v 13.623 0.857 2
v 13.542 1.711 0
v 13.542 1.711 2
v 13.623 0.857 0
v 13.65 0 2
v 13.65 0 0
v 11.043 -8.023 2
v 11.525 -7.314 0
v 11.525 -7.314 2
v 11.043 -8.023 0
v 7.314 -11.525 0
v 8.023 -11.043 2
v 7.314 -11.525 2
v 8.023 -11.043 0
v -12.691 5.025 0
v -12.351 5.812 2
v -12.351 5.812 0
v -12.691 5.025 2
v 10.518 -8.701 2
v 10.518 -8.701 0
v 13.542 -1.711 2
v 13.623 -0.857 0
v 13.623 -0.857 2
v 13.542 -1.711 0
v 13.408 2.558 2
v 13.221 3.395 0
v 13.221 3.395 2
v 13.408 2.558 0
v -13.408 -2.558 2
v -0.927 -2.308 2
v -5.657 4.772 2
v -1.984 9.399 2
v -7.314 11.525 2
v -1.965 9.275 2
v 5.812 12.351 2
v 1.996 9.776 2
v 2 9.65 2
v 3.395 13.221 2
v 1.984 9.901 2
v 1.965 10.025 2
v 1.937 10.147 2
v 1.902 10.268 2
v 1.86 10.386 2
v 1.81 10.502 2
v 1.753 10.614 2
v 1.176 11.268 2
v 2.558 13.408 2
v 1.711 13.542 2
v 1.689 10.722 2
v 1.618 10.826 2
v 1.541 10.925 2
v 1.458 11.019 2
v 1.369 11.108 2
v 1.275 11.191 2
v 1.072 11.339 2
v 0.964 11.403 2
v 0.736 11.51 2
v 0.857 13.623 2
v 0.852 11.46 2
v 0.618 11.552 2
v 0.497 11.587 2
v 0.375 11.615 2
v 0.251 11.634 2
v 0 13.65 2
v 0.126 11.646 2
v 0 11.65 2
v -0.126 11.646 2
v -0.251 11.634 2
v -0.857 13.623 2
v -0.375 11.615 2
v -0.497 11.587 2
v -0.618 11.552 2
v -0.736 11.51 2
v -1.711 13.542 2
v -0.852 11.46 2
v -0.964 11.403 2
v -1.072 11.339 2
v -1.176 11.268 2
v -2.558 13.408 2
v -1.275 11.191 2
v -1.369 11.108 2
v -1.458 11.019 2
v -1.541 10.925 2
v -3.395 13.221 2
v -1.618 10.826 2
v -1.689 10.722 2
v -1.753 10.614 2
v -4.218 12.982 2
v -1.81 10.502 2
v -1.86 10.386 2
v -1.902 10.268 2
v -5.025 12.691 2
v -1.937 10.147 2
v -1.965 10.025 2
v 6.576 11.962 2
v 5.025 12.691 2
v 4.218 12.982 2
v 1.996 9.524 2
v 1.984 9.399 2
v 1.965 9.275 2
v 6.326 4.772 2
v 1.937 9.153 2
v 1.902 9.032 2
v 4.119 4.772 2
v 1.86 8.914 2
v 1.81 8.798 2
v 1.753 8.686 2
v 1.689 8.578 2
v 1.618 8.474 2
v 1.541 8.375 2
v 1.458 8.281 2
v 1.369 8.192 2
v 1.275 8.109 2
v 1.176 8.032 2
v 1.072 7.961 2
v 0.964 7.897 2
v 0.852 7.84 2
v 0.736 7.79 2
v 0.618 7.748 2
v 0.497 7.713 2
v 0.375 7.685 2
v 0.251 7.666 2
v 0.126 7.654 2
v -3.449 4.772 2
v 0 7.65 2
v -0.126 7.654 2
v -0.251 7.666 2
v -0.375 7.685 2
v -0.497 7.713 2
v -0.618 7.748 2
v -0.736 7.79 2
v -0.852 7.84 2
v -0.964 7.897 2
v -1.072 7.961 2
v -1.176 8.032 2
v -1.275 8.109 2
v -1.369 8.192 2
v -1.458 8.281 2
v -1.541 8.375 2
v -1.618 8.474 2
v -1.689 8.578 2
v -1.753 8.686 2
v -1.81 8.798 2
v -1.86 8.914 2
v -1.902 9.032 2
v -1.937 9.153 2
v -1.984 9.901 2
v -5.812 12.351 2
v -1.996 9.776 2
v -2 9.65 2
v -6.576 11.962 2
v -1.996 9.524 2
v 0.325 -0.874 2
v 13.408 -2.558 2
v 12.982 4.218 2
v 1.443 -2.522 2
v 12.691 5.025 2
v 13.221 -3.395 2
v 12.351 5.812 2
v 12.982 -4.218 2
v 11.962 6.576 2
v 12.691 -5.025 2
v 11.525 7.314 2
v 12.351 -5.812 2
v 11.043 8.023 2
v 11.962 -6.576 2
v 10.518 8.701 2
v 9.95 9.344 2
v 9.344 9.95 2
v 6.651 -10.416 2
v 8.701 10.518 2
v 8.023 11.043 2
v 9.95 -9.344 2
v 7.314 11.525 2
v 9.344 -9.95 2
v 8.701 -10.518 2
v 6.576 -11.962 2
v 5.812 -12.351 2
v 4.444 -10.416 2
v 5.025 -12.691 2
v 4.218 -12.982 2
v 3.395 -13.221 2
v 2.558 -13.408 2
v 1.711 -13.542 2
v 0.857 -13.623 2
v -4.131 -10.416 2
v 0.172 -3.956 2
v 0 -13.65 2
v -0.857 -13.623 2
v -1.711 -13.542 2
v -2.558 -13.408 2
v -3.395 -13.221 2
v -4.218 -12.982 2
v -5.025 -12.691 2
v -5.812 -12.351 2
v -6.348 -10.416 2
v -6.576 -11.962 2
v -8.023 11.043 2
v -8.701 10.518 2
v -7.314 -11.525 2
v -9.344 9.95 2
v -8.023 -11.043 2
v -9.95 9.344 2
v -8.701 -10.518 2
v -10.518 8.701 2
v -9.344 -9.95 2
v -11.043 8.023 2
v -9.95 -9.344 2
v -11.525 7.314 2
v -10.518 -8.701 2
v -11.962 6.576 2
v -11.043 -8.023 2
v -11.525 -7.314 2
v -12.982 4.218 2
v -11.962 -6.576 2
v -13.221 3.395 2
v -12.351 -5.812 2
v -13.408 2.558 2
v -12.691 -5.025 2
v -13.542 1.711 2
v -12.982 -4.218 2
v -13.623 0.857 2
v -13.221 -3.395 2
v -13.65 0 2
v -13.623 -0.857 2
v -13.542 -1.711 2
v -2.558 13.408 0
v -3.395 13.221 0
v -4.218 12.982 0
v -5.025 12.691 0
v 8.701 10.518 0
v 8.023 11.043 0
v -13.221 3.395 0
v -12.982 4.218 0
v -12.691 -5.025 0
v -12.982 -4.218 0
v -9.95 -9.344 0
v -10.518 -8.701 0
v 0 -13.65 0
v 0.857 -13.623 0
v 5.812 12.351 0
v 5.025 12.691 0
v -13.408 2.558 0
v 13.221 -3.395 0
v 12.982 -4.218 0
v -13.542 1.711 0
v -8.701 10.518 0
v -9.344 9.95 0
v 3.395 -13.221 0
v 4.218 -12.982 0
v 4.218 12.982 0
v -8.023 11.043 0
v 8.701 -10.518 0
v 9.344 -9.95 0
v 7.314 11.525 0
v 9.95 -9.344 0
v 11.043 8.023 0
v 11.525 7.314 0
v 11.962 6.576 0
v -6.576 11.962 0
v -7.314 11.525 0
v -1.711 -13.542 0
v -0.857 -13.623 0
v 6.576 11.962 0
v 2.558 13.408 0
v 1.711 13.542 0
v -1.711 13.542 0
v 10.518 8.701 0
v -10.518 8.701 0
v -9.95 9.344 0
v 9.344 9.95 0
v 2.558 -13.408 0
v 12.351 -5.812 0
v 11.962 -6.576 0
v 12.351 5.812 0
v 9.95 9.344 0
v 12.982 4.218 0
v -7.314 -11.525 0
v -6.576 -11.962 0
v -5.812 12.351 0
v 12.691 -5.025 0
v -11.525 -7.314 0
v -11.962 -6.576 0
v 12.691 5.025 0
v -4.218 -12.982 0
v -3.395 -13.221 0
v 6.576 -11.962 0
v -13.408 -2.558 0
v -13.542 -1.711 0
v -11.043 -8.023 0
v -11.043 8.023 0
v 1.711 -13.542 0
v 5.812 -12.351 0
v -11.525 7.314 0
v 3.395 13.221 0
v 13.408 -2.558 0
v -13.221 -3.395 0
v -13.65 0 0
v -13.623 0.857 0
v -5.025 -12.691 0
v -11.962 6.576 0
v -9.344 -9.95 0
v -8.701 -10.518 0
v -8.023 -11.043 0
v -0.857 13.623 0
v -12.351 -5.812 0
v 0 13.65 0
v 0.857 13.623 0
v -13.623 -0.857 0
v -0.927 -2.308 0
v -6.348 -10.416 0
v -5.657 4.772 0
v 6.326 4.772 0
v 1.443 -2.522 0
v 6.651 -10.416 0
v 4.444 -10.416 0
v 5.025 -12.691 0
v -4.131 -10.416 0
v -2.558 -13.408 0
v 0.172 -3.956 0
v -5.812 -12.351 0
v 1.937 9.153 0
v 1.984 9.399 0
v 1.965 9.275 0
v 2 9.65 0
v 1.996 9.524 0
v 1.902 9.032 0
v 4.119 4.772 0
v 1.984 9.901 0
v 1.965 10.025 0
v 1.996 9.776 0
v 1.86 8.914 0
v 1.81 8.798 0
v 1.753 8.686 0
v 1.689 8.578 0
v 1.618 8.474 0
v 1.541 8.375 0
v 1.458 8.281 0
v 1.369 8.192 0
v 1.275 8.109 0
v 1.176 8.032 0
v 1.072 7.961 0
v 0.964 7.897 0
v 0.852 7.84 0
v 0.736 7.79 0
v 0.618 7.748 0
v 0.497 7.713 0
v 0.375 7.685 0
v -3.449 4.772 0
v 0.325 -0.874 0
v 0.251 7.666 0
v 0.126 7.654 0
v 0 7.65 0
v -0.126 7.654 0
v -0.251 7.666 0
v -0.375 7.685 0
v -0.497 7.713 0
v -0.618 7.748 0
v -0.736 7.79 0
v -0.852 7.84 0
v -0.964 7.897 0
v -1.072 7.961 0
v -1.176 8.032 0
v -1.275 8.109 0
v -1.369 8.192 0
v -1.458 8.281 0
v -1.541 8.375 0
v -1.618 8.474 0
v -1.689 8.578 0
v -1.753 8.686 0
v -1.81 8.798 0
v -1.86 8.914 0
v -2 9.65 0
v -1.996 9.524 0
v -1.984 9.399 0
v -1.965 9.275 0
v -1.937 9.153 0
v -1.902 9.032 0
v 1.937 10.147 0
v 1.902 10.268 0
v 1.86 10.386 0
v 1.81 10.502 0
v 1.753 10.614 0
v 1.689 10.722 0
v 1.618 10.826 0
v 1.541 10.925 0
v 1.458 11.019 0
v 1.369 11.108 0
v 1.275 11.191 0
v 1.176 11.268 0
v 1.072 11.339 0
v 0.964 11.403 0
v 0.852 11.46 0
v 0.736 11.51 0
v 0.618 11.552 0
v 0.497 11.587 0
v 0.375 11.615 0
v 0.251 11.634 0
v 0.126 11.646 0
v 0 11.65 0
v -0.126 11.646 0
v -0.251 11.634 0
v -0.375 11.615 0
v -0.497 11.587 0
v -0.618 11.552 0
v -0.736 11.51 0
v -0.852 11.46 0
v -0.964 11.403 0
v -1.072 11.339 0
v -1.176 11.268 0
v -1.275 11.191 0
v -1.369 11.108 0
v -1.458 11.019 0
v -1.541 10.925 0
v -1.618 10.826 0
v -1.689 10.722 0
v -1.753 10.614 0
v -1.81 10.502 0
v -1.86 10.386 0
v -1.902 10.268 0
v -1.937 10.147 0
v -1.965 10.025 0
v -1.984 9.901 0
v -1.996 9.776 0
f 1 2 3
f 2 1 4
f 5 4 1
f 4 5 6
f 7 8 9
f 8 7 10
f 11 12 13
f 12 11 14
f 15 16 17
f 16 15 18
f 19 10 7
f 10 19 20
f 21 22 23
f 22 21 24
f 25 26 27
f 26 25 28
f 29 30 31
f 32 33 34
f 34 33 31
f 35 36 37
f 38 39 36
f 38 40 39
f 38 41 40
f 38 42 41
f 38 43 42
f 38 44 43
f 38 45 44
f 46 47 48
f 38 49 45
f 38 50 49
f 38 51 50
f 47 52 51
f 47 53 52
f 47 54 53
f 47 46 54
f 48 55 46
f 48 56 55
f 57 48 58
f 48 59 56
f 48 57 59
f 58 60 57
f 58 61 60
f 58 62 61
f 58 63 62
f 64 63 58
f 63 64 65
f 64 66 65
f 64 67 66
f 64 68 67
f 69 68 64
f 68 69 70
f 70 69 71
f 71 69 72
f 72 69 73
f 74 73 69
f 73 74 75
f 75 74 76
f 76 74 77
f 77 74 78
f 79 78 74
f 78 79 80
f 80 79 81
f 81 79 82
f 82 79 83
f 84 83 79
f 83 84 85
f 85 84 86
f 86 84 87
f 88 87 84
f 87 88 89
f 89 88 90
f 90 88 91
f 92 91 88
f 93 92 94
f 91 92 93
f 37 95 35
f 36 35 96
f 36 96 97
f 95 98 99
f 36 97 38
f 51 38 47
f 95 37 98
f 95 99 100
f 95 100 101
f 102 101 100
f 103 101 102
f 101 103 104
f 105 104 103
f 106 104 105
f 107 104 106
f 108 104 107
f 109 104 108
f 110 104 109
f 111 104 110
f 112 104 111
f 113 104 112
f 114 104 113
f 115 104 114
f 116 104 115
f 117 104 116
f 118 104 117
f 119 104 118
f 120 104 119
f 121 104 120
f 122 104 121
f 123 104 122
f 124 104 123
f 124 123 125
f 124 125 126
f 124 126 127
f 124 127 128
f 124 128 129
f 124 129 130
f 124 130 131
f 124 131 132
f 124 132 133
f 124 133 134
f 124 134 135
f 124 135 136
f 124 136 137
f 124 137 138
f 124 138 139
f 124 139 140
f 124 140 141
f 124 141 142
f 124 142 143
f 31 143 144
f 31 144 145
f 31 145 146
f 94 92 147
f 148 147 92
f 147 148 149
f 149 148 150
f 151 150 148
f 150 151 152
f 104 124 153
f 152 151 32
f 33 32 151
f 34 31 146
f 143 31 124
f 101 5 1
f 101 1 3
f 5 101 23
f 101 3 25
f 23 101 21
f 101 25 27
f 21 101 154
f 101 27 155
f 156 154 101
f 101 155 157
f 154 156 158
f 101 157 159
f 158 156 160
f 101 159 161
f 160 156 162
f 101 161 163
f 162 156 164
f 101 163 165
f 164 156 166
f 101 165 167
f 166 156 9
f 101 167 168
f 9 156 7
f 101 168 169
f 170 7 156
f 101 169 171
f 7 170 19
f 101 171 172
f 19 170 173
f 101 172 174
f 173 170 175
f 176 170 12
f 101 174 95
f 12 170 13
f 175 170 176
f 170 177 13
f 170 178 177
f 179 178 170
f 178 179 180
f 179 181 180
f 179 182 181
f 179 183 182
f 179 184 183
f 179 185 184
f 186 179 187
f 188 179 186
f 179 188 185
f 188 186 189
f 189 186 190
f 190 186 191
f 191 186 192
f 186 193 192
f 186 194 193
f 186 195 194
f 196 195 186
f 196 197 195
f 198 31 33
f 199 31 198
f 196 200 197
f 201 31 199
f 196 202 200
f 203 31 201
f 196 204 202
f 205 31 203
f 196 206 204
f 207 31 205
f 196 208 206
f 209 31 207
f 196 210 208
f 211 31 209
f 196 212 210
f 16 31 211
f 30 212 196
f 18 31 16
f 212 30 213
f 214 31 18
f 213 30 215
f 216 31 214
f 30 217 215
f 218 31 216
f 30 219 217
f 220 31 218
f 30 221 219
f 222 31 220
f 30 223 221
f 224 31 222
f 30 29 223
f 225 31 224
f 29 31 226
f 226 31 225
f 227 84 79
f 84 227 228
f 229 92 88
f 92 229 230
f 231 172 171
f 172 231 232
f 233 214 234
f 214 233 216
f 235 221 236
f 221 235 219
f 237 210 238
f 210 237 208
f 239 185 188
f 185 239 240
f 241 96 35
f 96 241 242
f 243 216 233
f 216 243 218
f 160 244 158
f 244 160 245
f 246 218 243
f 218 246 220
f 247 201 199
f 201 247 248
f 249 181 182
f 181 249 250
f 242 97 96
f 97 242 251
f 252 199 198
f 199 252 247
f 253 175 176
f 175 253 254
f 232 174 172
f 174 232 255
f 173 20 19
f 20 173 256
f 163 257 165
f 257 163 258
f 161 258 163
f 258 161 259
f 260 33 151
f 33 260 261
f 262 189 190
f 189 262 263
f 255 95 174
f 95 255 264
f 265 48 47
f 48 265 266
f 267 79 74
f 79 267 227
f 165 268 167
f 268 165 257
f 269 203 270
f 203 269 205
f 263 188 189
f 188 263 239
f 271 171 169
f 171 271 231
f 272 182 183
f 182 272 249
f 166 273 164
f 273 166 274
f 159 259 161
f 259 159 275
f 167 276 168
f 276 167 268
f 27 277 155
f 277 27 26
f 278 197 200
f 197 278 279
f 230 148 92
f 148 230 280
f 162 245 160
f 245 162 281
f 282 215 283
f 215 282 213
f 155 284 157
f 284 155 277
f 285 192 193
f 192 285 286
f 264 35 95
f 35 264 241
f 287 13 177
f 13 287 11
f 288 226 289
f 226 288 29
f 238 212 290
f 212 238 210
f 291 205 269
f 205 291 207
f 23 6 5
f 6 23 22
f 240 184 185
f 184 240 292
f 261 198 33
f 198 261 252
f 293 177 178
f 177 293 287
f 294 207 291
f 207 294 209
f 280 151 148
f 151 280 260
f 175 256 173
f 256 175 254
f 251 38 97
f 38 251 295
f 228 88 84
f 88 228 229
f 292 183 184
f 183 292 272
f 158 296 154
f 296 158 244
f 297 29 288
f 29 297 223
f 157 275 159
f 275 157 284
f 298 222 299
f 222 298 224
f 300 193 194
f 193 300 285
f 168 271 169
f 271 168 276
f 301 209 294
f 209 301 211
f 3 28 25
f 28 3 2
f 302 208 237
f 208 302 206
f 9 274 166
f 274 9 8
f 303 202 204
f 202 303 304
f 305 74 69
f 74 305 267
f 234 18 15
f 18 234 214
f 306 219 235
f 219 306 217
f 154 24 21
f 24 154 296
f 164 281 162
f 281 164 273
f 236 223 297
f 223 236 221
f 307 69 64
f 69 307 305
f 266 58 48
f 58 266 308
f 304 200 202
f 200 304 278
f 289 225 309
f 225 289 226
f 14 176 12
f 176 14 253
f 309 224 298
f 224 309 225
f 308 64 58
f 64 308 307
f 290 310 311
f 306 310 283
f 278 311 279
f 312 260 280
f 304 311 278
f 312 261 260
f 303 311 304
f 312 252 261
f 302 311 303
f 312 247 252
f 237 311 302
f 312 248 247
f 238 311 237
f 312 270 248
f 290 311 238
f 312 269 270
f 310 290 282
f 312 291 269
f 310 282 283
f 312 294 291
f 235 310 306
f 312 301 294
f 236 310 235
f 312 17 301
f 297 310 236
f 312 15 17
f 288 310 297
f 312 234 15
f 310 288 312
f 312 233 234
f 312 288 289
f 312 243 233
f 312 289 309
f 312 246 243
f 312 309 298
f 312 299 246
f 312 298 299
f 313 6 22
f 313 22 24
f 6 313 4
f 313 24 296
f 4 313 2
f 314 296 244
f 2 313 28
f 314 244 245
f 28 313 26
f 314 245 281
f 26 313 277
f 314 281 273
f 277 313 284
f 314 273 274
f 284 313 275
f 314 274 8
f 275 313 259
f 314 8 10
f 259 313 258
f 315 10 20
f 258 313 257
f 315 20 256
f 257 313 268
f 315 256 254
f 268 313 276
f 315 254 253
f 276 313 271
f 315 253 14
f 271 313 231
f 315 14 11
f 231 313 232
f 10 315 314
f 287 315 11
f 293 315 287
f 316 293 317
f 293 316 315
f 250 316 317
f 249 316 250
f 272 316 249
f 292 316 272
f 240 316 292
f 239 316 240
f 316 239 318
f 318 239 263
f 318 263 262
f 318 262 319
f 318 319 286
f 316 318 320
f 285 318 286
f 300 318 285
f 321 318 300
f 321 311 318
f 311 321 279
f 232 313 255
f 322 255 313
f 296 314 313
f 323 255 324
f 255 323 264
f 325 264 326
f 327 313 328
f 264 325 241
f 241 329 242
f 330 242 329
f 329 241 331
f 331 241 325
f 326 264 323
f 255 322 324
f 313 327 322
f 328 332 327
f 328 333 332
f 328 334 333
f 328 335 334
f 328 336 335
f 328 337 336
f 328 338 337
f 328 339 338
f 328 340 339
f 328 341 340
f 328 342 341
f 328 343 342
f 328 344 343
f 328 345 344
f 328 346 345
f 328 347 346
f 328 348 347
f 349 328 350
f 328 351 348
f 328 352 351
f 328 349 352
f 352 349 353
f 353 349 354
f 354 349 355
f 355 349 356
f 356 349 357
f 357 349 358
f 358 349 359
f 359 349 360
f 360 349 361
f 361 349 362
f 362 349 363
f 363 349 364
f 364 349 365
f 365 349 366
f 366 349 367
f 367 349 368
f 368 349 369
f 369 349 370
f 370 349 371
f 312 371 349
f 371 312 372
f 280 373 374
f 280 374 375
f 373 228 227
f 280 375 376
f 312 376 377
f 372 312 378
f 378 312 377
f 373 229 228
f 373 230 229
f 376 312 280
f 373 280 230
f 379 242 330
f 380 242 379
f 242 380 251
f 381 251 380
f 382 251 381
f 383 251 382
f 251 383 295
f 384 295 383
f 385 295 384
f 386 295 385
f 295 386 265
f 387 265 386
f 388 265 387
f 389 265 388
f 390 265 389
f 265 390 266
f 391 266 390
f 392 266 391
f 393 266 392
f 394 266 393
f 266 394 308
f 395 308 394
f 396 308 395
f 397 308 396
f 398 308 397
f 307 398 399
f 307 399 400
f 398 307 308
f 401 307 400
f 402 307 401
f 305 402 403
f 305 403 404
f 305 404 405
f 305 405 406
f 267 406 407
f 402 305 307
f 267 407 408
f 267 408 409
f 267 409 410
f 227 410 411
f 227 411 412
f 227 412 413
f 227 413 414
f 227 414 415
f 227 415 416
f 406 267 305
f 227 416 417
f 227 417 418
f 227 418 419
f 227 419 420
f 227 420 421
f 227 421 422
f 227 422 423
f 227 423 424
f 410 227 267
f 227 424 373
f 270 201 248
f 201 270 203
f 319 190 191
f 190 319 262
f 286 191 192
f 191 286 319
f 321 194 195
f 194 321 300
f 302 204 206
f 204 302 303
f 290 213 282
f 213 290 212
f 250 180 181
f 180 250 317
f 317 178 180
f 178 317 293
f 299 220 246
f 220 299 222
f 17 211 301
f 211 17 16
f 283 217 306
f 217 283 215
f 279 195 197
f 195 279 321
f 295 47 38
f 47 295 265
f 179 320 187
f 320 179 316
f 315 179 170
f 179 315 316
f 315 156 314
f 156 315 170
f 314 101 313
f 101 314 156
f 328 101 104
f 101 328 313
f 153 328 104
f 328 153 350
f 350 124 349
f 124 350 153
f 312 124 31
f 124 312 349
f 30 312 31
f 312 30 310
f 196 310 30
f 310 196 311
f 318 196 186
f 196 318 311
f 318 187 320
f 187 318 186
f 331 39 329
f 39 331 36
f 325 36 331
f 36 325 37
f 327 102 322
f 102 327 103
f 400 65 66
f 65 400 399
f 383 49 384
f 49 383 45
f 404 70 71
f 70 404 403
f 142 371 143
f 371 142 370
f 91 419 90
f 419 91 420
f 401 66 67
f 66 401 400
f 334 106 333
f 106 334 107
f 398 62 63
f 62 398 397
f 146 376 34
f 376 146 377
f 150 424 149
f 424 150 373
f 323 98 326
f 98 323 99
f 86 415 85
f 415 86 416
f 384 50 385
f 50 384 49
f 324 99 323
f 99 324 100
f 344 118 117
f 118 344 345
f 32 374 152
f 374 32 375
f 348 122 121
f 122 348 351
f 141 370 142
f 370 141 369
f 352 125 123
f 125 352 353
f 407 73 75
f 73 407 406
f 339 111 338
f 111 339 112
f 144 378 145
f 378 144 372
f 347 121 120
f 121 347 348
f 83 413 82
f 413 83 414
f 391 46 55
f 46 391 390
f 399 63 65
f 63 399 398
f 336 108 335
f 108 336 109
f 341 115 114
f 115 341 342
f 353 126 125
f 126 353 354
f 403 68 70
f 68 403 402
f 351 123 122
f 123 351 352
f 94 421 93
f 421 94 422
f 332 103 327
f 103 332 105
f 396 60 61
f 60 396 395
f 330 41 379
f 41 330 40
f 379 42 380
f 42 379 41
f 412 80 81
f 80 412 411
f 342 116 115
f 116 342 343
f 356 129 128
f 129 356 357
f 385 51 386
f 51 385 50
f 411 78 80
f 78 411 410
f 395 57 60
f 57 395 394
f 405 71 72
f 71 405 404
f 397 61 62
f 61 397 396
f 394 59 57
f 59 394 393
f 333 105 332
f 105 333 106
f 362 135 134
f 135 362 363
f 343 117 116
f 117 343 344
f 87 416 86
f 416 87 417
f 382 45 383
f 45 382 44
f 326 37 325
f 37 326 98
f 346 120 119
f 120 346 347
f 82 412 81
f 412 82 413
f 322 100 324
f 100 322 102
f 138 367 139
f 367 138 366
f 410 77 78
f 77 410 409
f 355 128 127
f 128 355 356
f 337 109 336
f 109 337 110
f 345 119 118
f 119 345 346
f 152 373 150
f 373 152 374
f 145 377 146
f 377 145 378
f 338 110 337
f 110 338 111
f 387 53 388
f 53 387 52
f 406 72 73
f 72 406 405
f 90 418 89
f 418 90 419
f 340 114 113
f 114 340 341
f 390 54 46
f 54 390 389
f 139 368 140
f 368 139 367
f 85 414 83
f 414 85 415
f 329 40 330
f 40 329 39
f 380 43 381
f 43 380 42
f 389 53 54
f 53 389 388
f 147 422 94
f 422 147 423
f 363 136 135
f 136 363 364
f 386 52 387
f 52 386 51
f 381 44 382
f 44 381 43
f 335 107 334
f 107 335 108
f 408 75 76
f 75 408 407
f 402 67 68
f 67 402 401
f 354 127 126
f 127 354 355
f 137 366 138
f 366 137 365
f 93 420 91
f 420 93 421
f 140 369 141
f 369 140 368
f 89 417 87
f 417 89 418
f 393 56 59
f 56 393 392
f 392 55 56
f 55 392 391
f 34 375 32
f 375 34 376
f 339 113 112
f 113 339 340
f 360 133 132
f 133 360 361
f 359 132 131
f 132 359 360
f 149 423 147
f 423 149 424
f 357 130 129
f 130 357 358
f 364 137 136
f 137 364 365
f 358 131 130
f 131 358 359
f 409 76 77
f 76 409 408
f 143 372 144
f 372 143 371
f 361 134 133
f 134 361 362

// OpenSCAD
token_diameter=27.3;
token_height=2;
token_radius=token_diameter/2;
hole_diameter=4;
hole_border_distance=2;
hole_radius=hole_diameter/2;
decal_enabled=true;
decal_text="X";
z_rotation=0;
font="Marsh Stencil";
manual_font_size_enabled=false;
manual_font_size=10;
font_size=manual_font_size_enabled ? manual_font_size : -0.01*pow(token_diameter,2)+1.246*token_diameter-11.563;
manual_y_offset_enabled=false;
manual_y_offset=-2.8;
y_offset=manual_y_offset_enabled ? manual_y_offset : 0.0*pow(token_diameter,2)+0.0*token_diameter-3.0;
x_offset=0;

difference() {
    cylinder(token_height, token_radius, token_radius, $fn=100);
    if(decal_enabled) {
        rotate([0,0,z_rotation]) {
            translate([x_offset,y_offset,-1]) {
                linear_extrude(height=token_height+2) {
                    text(decal_text,font=font,size=font_size,halign="center",valign="center",script="utf-8");
                }
            }
        }
    }
    translate([0,token_radius-hole_radius-hole_border_distance,-1]) {
        cylinder(token_height+2, hole_radius, hole_radius, $fn=100);
    }
}

$vpr = [0,0,0];
$vpt = [0,0,-10];
$vpd = 90;
